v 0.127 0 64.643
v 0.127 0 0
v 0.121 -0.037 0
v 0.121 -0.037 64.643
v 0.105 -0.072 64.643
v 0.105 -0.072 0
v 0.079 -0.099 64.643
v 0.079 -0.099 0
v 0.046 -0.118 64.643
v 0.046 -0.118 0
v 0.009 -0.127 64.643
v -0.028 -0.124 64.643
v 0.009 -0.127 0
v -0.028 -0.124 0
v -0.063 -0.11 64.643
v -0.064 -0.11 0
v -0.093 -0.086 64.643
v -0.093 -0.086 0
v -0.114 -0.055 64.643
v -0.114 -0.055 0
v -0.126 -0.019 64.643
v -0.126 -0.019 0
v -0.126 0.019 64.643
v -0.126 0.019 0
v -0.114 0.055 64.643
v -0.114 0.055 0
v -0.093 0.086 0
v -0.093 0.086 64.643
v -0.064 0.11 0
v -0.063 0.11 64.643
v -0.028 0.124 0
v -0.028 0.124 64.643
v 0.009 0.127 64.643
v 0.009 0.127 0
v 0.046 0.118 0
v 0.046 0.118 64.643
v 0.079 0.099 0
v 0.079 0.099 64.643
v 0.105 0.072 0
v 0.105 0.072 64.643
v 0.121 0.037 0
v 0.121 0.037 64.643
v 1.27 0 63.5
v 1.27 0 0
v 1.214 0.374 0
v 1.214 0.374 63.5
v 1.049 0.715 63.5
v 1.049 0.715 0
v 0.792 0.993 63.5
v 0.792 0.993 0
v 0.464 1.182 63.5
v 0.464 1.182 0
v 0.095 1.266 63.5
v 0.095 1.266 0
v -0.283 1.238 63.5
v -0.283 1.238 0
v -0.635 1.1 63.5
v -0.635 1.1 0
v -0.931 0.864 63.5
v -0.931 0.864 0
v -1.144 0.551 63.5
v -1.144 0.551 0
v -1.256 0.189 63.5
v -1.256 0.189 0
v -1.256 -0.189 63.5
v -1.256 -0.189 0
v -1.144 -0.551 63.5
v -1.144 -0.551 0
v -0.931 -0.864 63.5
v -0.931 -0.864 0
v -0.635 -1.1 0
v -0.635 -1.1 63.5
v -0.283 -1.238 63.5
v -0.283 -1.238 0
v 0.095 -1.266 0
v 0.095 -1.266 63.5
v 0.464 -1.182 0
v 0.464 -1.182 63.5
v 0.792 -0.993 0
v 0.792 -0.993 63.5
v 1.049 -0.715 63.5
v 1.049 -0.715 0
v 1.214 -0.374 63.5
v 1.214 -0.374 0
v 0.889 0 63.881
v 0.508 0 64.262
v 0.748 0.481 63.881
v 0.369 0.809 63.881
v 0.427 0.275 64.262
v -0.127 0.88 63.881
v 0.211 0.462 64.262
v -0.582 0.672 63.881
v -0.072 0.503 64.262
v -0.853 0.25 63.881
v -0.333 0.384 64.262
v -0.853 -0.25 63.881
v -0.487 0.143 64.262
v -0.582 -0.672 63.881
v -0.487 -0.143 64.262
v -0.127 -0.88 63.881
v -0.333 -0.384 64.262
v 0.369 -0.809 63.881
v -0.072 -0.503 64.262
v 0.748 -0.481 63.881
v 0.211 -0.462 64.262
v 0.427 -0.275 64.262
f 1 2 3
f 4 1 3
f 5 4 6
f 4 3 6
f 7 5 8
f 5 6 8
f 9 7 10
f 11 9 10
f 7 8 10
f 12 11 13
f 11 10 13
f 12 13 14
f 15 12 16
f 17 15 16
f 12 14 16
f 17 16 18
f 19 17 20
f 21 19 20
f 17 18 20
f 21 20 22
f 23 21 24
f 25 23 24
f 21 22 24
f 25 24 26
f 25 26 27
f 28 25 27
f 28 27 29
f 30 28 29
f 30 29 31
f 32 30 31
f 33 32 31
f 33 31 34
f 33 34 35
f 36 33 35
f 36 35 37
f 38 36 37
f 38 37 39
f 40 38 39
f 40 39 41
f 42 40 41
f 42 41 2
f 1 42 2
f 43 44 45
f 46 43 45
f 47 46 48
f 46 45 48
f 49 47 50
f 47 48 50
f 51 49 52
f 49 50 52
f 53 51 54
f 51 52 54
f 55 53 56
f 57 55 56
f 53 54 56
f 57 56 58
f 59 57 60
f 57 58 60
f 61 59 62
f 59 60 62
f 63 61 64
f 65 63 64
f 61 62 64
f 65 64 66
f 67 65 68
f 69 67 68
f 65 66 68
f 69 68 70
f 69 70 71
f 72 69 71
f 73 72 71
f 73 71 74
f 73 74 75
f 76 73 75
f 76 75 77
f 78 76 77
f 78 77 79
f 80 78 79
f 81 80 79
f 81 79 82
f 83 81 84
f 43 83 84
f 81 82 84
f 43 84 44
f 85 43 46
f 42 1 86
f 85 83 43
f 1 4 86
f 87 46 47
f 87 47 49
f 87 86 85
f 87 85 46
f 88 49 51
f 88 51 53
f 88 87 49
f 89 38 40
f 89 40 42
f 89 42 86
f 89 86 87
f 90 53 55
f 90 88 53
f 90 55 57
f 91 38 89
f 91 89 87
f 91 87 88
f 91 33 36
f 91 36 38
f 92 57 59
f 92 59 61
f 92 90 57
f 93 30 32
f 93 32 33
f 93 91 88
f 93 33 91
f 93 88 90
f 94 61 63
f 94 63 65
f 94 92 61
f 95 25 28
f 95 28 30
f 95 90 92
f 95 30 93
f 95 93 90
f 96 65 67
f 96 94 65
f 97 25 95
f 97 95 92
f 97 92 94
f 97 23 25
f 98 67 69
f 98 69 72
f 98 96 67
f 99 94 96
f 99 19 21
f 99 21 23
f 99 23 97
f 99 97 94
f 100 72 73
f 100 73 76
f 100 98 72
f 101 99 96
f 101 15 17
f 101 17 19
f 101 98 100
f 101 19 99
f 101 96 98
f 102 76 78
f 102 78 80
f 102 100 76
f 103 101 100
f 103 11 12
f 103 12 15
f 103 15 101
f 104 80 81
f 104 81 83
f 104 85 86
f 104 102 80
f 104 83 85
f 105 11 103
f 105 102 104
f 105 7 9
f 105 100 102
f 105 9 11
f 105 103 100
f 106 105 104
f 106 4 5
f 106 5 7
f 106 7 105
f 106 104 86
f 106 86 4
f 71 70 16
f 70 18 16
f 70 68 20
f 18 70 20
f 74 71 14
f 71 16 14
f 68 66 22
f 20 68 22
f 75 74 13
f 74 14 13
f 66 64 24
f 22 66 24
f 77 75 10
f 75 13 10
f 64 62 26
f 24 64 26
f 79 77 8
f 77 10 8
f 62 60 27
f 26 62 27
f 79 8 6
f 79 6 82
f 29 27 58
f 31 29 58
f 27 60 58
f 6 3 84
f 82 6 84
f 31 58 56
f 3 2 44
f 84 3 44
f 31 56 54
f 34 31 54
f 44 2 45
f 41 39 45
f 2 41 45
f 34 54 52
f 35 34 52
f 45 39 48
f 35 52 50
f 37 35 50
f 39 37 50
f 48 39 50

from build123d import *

# Parameters (mm, degrees)
F0_R     = 1.27
F1_DEPTH = 64.77
F2_SIZE  = 1.27
F3_R     = 0.127
F4_DEPTH = 64.771


with BuildPart() as f1:
    # F0 (on Top) → F1 (new body)
    with BuildSketch(Plane.XY):
        Circle(F0_R)
    extrude(amount=F1_DEPTH)

    # F2
    f2_edges = [f1.edges().sort_by_distance(p)[0] for p in [
        (-1.27, 0, 64.77),
    ]]
    chamfer(f2_edges, length=F2_SIZE)

    # F3 (on face) → F4 (cut, through all)
    with BuildSketch(Plane(origin=(0, 0, 0), x_dir=(1, 0, 0), z_dir=(0, 0, -1))):
        Circle(F3_R)
    extrude(amount=-F4_DEPTH, mode=Mode.SUBTRACT)


solid = f1.part
